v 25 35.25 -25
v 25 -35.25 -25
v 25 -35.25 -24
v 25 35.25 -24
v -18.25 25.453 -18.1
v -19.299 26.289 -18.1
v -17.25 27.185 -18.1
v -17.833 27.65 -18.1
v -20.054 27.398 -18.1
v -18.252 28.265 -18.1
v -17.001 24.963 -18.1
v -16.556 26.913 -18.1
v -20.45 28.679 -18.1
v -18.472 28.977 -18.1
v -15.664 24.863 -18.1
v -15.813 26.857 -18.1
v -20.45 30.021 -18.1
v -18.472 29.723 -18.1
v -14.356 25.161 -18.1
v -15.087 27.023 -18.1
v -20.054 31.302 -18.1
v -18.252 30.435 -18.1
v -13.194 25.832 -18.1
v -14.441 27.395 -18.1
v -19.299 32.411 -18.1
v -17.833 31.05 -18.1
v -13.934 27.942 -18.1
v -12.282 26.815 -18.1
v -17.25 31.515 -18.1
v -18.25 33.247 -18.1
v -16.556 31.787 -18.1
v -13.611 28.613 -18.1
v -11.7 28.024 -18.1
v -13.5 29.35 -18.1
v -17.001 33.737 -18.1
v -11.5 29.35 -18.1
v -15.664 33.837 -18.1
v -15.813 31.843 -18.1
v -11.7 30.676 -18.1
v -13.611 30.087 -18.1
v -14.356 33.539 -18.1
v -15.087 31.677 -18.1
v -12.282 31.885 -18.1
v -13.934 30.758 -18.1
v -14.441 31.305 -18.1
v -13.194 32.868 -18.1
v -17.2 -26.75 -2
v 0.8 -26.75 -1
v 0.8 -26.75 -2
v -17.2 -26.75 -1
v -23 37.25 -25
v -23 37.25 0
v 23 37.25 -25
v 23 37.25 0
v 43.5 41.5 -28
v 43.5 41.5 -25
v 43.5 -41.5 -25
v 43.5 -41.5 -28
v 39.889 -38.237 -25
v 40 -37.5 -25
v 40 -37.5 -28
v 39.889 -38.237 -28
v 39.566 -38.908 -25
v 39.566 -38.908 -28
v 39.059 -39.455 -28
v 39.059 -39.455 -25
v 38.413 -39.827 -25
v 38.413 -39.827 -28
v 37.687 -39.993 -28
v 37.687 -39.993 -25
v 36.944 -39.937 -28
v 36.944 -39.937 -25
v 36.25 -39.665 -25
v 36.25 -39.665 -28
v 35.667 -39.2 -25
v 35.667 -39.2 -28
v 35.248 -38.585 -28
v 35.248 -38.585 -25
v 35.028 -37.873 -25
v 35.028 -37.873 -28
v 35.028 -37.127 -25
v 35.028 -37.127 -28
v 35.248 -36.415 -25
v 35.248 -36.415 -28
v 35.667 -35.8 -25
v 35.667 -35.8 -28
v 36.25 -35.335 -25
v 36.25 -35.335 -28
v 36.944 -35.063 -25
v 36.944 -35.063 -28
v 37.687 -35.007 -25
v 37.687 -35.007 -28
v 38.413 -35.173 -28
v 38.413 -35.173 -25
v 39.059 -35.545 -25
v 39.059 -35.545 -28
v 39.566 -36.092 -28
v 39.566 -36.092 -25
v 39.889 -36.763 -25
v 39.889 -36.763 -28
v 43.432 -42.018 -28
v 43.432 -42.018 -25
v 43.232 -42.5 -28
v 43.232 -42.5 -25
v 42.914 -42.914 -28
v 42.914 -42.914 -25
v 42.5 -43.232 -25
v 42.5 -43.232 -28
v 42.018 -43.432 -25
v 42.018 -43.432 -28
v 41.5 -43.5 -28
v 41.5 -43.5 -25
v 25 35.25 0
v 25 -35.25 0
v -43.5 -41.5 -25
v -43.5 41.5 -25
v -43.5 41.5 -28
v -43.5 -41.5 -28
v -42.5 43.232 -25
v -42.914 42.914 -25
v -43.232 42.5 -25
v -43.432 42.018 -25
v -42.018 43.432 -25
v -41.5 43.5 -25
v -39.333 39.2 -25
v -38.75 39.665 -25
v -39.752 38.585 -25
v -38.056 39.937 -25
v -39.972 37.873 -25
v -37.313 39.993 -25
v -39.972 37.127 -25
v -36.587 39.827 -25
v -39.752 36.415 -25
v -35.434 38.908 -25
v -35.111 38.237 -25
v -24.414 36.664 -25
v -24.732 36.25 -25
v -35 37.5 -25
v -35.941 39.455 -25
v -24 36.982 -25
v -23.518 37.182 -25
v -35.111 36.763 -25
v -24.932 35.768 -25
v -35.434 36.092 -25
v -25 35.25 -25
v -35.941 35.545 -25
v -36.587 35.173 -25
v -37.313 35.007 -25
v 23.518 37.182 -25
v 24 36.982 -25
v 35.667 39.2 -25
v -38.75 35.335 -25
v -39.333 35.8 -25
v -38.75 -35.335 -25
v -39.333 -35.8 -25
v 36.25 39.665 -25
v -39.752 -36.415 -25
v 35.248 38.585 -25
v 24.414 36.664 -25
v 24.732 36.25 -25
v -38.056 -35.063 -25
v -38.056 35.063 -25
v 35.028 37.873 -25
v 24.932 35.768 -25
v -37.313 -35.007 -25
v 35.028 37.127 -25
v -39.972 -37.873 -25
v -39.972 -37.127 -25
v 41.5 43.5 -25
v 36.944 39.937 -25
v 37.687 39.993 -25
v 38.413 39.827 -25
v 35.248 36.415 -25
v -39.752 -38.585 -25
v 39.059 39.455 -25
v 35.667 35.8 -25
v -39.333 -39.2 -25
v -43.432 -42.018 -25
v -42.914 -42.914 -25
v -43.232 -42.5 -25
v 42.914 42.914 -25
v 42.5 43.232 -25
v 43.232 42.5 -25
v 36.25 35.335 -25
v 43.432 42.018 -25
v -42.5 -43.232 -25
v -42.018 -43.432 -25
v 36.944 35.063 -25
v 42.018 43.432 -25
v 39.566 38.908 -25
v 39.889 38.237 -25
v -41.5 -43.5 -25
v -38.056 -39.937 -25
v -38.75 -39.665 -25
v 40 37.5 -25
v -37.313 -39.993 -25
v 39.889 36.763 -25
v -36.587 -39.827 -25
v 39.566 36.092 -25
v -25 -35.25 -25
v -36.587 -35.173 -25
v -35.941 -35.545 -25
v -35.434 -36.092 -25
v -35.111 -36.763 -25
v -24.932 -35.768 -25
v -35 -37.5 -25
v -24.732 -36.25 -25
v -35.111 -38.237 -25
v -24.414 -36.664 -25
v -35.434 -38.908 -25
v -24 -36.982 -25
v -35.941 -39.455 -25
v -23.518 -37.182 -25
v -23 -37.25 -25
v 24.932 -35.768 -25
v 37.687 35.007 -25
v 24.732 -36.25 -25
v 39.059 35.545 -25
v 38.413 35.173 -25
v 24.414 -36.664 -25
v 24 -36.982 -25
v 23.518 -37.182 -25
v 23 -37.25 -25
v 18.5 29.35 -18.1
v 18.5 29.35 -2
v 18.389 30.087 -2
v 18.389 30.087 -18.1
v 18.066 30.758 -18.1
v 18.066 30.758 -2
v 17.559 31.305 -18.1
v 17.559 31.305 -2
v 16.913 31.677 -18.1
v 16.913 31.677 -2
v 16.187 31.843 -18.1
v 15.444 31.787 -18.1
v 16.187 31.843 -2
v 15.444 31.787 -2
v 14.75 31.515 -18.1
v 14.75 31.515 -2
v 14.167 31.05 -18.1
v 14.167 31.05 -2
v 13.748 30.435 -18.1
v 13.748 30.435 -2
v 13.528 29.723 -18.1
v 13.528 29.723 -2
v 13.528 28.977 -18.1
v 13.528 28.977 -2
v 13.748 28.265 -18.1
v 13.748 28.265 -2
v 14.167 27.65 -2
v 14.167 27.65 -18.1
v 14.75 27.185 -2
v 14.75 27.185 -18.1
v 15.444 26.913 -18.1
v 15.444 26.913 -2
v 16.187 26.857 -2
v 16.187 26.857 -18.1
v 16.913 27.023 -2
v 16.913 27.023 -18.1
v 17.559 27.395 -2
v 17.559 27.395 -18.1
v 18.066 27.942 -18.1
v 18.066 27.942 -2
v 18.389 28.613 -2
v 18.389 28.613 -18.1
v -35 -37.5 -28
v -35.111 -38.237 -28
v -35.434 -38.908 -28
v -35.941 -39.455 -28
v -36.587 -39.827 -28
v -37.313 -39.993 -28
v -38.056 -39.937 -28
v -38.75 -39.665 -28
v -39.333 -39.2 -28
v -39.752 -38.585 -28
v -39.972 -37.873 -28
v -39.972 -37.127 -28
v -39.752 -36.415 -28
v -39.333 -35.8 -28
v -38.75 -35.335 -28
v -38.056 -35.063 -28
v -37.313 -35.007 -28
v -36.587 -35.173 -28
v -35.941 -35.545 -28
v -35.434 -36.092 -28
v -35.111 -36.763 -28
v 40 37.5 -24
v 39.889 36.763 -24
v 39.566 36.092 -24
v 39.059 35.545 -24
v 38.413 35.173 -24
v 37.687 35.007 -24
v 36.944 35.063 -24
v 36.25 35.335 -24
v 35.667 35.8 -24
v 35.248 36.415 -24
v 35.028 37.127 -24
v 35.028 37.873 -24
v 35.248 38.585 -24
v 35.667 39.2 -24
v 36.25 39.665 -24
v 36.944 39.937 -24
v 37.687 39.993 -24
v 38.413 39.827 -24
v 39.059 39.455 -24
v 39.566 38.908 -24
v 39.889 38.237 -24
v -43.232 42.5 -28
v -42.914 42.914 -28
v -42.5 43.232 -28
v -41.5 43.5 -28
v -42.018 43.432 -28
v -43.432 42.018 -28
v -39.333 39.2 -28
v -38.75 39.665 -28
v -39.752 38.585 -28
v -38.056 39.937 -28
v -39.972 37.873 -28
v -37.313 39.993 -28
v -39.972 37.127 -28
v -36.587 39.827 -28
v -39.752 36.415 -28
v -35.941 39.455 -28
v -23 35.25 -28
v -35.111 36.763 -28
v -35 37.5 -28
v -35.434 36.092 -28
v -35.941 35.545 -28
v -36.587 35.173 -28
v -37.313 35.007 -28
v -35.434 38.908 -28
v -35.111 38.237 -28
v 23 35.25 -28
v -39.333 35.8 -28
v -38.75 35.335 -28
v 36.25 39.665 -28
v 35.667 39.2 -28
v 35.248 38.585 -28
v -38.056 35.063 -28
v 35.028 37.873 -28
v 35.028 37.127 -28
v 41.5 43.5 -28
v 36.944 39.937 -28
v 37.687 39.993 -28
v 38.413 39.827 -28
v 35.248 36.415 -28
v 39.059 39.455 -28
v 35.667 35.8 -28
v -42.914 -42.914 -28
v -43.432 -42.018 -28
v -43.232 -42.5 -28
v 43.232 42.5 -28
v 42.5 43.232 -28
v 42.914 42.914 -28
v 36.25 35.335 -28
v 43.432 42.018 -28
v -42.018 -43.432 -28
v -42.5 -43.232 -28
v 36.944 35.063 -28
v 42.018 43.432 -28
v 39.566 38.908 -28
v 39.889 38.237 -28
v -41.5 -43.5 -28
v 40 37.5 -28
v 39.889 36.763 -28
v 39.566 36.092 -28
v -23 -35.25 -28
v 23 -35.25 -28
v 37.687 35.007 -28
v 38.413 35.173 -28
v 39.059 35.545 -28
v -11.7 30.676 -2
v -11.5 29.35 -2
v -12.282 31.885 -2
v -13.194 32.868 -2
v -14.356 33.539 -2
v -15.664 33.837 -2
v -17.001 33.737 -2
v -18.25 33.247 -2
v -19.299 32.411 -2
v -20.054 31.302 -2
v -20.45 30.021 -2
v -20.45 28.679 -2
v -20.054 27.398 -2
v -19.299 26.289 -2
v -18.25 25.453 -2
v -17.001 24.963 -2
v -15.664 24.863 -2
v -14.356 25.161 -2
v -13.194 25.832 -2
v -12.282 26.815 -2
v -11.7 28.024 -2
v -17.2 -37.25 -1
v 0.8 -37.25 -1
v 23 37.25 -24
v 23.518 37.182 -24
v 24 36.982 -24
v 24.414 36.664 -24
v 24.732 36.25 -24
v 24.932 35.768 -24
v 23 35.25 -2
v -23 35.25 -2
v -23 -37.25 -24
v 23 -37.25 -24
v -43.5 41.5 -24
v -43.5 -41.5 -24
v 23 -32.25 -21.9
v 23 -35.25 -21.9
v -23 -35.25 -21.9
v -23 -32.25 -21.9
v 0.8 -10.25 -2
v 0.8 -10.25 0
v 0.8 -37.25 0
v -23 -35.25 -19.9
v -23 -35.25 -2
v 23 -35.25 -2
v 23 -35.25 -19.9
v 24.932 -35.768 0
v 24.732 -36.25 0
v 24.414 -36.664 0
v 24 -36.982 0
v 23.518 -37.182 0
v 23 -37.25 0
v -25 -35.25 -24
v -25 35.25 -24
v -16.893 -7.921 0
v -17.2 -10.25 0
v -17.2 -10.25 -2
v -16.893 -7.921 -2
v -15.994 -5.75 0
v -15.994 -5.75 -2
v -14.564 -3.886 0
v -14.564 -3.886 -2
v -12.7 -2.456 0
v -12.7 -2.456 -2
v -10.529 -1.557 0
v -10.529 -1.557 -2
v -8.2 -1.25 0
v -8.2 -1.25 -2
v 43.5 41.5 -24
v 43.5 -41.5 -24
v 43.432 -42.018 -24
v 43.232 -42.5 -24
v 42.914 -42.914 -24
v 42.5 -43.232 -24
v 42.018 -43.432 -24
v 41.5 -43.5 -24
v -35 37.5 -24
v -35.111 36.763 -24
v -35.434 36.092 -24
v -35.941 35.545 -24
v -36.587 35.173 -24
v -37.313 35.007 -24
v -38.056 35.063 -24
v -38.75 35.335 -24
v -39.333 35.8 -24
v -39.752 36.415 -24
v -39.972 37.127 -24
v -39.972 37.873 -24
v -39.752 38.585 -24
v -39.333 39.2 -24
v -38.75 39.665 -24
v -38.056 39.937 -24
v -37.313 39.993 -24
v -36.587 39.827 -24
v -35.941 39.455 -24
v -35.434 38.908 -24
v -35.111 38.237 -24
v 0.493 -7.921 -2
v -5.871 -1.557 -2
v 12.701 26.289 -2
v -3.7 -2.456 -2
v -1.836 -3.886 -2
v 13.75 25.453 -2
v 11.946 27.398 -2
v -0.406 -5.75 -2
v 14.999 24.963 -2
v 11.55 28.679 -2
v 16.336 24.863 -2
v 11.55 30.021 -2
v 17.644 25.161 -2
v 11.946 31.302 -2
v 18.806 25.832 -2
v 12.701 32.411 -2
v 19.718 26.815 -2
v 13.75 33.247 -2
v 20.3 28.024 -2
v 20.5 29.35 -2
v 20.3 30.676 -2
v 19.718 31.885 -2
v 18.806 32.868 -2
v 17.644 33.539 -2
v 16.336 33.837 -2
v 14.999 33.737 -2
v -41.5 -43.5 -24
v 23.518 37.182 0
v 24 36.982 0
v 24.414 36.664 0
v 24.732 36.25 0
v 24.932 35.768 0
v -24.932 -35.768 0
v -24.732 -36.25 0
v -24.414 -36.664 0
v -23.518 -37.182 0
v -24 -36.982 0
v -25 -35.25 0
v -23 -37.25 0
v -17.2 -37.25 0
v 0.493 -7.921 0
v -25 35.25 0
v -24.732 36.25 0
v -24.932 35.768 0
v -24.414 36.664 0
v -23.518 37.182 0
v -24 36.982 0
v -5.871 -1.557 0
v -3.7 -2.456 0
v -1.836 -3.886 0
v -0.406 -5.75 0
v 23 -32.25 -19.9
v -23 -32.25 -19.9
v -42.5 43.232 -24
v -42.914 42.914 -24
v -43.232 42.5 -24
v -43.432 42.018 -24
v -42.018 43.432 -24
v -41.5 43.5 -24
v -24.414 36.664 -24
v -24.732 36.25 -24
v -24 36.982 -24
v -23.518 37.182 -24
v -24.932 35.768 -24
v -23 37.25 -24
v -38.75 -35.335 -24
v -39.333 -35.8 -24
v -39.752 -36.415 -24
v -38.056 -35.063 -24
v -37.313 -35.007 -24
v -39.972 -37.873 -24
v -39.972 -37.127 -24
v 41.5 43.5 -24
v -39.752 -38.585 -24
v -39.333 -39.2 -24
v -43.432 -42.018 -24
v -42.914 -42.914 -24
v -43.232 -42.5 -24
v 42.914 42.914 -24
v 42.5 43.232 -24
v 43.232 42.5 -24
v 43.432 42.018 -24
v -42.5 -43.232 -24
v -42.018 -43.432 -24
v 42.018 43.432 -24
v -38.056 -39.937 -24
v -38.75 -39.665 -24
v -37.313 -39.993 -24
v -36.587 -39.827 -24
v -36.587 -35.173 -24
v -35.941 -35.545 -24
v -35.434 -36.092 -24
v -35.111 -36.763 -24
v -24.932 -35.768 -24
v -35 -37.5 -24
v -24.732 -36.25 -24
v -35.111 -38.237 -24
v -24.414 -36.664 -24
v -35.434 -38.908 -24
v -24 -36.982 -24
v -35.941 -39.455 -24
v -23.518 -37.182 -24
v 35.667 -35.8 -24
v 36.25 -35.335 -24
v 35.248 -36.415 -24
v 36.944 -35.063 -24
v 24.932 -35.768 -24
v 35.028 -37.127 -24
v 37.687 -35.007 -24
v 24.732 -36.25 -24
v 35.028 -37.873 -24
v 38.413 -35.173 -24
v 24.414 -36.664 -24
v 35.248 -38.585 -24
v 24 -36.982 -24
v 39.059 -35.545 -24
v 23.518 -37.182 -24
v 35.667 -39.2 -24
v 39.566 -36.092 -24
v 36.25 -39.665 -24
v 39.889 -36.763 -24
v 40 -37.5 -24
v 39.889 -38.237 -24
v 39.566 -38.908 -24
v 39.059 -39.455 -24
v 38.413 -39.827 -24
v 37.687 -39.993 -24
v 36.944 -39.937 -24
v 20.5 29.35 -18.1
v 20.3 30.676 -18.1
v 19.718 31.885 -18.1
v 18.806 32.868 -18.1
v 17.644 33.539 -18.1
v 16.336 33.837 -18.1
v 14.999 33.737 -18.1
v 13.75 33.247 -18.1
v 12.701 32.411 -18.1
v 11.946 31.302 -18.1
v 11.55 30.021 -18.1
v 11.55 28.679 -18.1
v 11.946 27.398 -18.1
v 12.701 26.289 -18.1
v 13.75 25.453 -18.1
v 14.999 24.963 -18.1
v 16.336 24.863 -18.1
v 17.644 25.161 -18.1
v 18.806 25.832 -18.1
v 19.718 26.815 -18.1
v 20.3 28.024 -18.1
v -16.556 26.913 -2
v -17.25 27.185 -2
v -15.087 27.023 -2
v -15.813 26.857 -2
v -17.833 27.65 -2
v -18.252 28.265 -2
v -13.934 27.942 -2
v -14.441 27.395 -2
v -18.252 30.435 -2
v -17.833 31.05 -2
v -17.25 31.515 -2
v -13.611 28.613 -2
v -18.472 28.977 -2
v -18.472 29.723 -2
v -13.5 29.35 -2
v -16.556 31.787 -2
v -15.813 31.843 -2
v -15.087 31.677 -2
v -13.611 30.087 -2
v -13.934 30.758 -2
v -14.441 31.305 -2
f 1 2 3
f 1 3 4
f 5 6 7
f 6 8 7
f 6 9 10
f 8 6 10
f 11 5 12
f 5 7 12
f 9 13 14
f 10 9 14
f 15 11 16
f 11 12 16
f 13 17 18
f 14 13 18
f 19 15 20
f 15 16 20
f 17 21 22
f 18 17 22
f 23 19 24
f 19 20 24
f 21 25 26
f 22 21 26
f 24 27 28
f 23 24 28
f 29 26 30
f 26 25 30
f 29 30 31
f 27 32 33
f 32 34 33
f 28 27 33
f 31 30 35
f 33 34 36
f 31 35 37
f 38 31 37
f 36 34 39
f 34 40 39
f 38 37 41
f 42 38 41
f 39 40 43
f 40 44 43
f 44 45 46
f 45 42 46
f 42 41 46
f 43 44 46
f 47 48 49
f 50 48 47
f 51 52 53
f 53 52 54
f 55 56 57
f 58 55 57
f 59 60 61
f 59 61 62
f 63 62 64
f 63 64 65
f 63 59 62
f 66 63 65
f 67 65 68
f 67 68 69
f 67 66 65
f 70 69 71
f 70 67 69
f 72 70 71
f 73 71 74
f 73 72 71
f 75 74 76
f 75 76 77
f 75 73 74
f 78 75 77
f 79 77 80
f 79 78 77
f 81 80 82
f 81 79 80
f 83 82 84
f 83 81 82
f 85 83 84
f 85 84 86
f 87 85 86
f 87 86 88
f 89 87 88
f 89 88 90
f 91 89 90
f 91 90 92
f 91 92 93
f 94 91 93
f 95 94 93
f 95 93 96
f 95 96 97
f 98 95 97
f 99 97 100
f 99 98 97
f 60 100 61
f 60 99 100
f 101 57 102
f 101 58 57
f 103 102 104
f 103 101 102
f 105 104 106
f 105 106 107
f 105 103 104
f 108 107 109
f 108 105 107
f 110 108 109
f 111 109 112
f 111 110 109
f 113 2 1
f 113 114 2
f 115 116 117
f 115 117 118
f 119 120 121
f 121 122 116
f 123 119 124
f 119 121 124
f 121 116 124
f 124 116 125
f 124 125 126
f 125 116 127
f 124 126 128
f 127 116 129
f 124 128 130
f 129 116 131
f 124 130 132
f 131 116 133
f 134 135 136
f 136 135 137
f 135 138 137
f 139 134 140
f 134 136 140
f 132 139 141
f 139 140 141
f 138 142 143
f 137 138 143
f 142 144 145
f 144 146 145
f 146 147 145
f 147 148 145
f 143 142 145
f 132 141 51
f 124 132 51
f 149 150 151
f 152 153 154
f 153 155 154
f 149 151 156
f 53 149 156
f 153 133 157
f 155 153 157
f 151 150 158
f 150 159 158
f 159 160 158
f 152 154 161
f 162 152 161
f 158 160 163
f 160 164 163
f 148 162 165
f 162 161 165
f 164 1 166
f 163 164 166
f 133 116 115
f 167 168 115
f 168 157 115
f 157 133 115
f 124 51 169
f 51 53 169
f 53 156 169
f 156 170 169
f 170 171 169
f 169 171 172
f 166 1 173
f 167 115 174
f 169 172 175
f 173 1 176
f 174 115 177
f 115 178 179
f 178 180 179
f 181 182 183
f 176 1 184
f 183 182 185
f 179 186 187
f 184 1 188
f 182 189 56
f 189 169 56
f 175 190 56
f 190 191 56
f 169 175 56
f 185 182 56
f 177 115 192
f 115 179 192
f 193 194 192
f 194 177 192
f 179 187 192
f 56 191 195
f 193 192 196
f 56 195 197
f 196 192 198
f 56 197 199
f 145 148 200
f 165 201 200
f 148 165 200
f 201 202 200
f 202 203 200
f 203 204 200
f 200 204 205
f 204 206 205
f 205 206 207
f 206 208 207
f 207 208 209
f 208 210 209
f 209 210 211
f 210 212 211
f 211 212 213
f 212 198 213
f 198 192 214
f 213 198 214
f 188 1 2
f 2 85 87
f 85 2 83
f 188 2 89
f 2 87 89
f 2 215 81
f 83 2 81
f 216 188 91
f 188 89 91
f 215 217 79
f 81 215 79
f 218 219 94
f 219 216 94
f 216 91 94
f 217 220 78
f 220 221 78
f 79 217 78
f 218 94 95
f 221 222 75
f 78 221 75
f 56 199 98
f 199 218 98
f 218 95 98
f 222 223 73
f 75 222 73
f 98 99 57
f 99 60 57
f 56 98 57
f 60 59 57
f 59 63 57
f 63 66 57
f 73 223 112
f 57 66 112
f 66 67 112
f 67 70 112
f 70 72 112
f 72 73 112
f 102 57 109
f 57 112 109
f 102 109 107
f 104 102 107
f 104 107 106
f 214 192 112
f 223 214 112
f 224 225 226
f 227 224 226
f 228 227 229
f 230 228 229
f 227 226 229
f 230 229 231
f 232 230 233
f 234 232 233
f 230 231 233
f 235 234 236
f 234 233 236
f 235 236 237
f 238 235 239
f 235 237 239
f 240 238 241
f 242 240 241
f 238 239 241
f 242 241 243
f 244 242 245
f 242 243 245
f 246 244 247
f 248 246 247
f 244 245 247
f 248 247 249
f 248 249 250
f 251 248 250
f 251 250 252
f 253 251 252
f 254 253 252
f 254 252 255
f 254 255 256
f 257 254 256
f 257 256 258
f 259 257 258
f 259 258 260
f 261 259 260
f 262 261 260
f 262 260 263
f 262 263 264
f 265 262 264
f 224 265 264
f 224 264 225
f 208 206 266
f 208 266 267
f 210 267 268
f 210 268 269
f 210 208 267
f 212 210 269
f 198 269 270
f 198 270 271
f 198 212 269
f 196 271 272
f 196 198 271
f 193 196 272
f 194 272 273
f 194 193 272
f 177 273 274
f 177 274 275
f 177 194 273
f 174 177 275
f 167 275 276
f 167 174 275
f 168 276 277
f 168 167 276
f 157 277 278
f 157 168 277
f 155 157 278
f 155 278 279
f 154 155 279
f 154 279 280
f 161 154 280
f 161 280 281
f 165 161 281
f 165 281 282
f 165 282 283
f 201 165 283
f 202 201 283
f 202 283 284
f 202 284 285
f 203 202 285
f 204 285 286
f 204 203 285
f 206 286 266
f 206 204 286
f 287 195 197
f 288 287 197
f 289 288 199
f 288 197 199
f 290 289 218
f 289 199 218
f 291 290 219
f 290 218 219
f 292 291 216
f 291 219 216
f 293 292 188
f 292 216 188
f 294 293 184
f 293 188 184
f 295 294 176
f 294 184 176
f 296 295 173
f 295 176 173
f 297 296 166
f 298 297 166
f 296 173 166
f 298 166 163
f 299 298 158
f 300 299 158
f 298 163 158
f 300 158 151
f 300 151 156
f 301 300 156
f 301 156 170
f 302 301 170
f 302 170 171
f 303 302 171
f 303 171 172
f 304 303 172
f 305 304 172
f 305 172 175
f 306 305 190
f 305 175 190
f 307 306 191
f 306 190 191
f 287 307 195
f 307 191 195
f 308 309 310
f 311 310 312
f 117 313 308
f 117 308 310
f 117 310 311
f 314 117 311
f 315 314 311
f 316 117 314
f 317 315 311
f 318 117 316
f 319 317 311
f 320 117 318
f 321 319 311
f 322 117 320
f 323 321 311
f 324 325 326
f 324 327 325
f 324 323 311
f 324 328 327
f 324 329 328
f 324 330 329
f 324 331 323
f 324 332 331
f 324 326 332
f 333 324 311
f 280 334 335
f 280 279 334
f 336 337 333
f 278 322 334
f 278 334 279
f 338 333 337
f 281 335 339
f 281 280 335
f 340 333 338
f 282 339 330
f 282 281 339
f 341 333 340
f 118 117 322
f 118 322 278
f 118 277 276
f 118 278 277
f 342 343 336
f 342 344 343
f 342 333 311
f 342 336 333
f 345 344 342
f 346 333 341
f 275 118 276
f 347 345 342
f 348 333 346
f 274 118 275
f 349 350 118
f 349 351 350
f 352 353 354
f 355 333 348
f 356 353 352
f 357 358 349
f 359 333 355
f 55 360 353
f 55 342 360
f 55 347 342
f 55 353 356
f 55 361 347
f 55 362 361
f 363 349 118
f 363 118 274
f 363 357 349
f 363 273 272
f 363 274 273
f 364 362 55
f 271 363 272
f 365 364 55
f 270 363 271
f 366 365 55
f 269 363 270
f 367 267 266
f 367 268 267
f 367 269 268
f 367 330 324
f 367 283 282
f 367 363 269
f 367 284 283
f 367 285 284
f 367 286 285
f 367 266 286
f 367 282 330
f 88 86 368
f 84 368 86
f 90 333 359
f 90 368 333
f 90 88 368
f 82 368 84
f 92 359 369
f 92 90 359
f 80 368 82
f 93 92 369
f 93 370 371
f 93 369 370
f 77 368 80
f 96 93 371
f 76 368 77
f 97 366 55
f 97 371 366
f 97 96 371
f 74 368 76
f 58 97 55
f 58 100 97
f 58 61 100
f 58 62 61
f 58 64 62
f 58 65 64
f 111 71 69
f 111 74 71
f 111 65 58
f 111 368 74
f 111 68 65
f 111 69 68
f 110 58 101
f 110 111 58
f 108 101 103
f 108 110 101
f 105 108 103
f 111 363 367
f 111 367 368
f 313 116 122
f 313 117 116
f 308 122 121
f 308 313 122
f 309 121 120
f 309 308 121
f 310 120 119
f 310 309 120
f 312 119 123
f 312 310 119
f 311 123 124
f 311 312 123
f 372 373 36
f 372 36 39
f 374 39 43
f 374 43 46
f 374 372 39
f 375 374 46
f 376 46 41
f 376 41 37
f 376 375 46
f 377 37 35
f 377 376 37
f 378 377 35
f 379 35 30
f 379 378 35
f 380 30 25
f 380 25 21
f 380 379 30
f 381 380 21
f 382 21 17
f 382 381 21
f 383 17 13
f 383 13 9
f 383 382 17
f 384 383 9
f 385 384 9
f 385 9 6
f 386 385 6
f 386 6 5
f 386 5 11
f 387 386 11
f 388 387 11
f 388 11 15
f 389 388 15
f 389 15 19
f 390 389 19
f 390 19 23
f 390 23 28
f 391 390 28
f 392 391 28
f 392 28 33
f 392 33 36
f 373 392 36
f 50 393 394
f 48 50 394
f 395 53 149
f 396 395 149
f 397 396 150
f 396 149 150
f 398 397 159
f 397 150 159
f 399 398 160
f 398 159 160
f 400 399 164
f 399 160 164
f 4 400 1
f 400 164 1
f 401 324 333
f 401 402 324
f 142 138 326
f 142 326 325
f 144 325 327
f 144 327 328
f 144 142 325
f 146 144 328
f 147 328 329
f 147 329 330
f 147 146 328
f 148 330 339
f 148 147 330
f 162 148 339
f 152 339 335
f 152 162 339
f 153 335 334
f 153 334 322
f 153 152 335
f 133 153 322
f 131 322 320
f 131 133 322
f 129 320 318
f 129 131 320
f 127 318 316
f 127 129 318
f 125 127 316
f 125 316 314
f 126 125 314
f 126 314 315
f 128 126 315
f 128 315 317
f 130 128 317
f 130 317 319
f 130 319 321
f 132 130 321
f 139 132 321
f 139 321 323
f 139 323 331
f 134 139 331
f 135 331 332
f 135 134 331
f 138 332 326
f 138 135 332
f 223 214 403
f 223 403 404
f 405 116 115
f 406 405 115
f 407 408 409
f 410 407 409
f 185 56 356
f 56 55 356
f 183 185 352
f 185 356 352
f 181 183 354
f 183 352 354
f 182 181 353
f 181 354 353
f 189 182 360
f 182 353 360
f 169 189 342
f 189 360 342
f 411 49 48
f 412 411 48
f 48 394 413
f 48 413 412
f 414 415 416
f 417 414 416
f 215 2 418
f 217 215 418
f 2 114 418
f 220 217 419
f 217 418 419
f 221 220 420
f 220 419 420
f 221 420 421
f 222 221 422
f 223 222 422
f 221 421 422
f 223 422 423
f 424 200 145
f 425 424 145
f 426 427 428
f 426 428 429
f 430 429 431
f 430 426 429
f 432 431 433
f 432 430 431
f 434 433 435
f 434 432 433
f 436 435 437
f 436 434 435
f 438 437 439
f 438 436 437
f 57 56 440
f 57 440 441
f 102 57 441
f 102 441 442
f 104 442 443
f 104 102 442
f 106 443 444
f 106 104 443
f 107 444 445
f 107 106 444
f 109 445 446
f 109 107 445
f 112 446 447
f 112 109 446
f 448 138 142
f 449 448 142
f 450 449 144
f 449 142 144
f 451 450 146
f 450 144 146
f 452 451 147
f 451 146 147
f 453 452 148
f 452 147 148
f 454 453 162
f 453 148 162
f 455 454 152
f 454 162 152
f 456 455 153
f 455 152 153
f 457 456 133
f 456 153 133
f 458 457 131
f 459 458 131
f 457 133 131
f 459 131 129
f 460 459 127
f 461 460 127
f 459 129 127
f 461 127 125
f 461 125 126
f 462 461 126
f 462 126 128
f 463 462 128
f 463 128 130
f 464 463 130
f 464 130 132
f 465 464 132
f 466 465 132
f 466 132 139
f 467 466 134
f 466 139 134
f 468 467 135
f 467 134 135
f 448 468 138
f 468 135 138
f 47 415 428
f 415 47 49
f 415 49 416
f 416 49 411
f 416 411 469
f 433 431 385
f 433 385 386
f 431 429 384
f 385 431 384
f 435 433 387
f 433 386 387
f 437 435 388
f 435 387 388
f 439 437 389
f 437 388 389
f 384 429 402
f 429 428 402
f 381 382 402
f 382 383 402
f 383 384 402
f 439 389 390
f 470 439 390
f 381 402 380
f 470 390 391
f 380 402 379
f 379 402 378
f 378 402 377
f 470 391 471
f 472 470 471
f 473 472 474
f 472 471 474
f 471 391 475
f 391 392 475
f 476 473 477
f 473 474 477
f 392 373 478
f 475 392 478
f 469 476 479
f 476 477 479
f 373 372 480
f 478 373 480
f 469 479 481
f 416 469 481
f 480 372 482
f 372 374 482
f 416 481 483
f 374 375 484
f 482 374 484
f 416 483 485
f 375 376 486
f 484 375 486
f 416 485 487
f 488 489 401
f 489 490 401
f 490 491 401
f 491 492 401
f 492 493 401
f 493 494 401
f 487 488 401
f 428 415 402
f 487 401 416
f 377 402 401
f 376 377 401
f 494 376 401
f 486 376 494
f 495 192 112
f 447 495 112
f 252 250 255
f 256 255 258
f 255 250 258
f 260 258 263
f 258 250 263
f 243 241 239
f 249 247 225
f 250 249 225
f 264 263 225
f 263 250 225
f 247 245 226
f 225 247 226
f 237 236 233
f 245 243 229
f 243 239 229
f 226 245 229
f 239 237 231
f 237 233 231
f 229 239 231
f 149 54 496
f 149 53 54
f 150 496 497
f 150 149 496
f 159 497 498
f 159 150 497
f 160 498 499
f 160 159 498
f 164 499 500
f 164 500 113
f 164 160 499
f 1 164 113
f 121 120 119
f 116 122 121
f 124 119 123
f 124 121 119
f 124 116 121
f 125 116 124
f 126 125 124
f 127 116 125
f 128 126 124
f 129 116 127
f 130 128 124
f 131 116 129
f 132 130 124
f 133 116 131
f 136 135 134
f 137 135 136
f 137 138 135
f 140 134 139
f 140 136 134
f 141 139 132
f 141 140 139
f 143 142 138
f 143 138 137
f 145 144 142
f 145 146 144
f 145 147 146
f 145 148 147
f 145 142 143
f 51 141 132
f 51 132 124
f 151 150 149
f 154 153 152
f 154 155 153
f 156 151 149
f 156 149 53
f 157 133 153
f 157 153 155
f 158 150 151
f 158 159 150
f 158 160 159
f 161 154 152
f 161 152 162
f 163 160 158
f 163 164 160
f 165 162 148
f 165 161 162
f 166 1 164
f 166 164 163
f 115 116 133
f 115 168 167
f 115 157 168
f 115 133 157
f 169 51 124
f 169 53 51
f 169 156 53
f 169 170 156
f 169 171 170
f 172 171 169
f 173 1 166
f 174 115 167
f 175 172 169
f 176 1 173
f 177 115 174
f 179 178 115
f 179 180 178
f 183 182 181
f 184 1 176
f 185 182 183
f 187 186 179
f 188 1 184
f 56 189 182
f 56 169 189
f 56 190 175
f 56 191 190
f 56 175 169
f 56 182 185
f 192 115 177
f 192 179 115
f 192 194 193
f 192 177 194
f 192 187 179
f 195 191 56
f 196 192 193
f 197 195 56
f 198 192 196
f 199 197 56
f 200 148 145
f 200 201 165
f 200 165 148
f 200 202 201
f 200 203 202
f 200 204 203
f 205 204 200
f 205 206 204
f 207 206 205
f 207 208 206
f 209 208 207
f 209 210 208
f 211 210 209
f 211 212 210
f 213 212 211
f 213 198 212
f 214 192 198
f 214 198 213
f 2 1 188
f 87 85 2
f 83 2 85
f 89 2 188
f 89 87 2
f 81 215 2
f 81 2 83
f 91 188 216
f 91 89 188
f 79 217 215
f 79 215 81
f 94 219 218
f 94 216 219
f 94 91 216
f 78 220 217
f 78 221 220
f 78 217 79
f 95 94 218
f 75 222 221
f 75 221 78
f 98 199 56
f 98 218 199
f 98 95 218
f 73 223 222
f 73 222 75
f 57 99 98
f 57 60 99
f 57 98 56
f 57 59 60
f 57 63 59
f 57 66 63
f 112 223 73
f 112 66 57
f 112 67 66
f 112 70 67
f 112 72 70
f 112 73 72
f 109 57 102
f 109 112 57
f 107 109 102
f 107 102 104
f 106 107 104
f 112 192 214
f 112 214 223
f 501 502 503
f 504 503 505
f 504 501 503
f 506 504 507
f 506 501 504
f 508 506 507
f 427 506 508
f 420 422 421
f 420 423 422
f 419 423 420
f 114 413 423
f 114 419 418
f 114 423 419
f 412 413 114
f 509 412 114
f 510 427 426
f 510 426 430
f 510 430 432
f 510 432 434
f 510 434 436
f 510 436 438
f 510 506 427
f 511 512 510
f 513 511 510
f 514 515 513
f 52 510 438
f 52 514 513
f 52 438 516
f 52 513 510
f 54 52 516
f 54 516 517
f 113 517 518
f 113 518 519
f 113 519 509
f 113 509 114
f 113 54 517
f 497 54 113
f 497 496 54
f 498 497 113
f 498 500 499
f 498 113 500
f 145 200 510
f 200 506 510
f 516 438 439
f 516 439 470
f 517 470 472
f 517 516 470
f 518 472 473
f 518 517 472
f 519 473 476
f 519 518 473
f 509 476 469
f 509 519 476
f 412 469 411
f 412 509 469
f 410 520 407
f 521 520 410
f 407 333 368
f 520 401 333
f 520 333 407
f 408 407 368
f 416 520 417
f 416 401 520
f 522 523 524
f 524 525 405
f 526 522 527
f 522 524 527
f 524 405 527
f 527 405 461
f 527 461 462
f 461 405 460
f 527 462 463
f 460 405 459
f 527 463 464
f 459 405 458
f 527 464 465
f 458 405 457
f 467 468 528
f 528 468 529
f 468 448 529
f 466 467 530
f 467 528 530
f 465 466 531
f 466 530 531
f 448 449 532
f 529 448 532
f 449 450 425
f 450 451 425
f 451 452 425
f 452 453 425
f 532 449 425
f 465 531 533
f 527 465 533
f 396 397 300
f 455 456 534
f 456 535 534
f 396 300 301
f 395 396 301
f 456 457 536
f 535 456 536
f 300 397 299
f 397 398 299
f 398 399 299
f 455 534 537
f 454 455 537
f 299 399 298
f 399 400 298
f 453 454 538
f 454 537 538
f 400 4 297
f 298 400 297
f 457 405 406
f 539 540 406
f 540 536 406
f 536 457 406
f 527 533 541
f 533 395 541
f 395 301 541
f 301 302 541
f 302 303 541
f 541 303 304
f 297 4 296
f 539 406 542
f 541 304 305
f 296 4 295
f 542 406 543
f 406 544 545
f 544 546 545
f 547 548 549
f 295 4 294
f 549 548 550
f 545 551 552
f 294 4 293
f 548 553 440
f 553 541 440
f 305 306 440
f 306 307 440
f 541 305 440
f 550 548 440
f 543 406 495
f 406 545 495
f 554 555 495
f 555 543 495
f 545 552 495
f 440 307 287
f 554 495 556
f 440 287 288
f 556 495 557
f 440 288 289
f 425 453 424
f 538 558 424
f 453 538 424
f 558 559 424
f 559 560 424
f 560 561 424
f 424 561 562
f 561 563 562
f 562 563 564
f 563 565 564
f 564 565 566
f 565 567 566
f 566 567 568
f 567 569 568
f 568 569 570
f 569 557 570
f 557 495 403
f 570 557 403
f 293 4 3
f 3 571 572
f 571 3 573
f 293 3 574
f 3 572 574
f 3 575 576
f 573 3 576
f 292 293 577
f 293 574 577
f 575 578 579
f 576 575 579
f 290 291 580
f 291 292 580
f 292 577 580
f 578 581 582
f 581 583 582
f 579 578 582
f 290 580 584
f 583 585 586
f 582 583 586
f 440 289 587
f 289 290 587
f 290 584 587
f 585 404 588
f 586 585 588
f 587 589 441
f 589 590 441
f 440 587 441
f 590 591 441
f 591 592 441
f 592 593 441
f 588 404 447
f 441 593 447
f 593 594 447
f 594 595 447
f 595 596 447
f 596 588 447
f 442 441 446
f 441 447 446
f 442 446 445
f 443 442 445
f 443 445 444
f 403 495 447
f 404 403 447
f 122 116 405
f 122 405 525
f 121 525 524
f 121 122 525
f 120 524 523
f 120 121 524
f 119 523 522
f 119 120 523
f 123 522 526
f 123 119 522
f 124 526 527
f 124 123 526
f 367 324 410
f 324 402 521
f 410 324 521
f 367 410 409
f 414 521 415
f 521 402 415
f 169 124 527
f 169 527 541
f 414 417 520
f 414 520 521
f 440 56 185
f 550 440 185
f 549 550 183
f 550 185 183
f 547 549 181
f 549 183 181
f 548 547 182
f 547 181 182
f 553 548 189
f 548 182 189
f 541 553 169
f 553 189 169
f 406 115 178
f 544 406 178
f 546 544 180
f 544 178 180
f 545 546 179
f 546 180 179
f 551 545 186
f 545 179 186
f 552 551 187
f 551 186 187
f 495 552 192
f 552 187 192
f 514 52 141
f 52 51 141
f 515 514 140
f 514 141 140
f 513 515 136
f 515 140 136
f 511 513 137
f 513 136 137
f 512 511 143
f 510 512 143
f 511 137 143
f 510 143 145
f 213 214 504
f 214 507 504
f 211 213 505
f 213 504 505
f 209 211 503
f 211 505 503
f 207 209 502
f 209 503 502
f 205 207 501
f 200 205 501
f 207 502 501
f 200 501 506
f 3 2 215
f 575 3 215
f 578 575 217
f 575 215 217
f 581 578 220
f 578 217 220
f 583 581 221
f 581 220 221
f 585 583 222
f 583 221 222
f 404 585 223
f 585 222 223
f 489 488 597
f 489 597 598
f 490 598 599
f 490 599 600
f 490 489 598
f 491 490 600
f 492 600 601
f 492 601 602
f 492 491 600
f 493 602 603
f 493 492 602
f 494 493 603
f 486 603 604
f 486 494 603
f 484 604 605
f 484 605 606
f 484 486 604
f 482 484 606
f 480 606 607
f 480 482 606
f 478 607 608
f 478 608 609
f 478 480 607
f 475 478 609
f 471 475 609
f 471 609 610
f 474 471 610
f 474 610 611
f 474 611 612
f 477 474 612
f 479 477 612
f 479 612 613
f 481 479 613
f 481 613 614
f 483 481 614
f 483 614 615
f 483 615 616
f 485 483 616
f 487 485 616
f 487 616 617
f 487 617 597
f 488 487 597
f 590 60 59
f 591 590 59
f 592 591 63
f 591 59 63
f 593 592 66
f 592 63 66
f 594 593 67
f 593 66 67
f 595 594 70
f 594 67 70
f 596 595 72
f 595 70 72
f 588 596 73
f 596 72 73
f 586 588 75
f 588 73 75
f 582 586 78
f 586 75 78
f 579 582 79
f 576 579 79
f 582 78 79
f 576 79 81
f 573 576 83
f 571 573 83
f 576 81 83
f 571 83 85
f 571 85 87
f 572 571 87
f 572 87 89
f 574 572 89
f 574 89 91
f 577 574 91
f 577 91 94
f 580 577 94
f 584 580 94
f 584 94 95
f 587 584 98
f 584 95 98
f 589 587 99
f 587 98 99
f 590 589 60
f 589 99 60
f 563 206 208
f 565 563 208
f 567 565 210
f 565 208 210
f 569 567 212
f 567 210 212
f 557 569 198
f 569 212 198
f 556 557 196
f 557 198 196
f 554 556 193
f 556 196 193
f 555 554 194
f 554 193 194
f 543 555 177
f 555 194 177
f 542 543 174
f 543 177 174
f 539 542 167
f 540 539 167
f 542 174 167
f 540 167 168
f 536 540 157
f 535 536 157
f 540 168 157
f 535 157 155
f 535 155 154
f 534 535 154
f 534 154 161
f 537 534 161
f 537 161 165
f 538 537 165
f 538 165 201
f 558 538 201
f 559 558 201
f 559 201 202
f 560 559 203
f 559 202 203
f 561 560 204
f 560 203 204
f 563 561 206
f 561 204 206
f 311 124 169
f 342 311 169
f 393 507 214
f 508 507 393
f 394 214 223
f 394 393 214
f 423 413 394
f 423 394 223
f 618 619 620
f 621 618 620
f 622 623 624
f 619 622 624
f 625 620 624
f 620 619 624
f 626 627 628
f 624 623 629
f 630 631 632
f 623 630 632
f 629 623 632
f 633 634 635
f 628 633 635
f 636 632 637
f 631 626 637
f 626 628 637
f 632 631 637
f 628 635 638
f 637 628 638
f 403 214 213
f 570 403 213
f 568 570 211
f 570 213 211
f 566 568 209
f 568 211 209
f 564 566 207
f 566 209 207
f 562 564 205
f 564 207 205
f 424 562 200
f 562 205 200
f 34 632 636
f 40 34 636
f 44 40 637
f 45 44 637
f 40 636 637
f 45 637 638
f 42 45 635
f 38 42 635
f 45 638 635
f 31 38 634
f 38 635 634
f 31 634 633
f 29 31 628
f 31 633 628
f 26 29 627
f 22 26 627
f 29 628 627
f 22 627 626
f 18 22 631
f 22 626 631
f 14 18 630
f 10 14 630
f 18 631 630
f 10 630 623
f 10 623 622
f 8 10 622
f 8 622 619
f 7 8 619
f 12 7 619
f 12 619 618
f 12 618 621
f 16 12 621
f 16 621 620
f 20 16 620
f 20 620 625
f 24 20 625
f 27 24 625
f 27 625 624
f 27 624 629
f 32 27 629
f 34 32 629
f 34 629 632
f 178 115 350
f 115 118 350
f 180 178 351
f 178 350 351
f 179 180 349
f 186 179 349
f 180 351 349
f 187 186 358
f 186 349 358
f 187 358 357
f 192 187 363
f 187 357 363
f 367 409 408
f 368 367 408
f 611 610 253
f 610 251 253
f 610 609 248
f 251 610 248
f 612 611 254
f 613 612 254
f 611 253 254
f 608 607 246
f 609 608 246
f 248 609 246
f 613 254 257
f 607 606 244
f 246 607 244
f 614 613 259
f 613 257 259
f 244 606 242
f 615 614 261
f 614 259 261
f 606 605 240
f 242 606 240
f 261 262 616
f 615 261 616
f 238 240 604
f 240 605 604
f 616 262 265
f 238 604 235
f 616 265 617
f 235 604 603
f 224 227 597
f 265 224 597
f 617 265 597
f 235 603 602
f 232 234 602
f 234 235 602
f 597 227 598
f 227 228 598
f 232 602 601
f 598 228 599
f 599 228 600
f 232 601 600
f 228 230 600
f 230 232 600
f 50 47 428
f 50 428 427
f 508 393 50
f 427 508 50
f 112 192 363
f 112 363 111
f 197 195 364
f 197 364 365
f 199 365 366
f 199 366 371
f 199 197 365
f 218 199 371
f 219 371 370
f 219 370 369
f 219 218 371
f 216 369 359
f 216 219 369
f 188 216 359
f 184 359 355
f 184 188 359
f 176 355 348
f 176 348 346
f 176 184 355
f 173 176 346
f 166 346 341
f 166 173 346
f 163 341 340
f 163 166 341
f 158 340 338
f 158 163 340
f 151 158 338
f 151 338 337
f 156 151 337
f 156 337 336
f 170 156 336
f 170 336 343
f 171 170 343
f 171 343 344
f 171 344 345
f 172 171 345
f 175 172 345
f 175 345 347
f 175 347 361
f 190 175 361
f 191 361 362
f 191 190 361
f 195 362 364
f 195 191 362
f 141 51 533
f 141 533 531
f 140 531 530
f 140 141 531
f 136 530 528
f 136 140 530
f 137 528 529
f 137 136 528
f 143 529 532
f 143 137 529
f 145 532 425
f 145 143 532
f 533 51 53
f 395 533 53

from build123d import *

# Parameters (mm, degrees)
F0_W      = 50
F0_H      = 74.5
F0_W_2    = 46
F0_H_2    = 70.5
F0_R      = 4.5
F0_R_2    = 2.5
F1_DEPTH  = 2
F2_DEPTH  = 25
F3_DEPTH  = 18.1
F4_W      = 46
F4_H      = 2
F5_DEPTH  = 3
F6_W      = 87
F6_H      = 87
F6_R      = 2.5
F6_W_2    = 50
F6_H_2    = 74.5
F6_W_3    = 46
F6_H_3    = 70.5
F7_DEPTH  = 3
F8_R      = 2
F9_DEPTH  = 1
F10_W     = 18
F10_H     = 1
F11_DEPTH = 25


with BuildPart() as f1:
    # F0 (on Top) → F1 (new body)
    with BuildSketch(Plane.XY):
        Rectangle(F0_W, F0_H)
        Rectangle(F0_W_2, F0_H_2, mode=Mode.SUBTRACT)
        Rectangle(F0_W_2, F0_H_2)
        Polygon((0.8, -26.75), (-17.2, -26.75), (-17.2, -10.25), (-17.2, -1.25), (-8.2, -1.25), (0.8, -1.25), (0.8, -10.25), align=None, mode=Mode.SUBTRACT)
        with Locations((-16, 29.35)):
            Circle(F0_R, mode=Mode.SUBTRACT)
        with Locations((16, 29.35)):
            Circle(F0_R, mode=Mode.SUBTRACT)
        with Locations((-16, 29.35)):
            Circle(F0_R)
        with Locations((-16, 29.35)):
            Circle(F0_R_2, mode=Mode.SUBTRACT)
        with Locations((16, 29.35)):
            Circle(F0_R)
        with Locations((16, 29.35)):
            Circle(F0_R_2, mode=Mode.SUBTRACT)
        with Locations((-16, 29.35)):
            Circle(F0_R_2)
        with Locations((16, 29.35)):
            Circle(F0_R_2)
        with BuildLine():
            Line((-17.2, -1.25), (-17.2, -10.25))
            ThreePointArc((-17.2, -10.25), (-14.5639610307, -3.8860389693), (-8.2, -1.25))
            Line((-8.2, -1.25), (-17.2, -1.25))
        make_face()
        with BuildLine():
            ThreePointArc((-8.2, -1.25), (-1.8360389693, -3.8860389693), (0.8, -10.25))
            Line((0.8, -10.25), (0.8, -1.25))
            Line((0.8, -1.25), (-8.2, -1.25))
        make_face()
    extrude(amount=-F1_DEPTH)

    # F0 (on Top) → F2 (join)
    with BuildSketch(Plane.XY):
        Rectangle(F0_W, F0_H)
        Rectangle(F0_W_2, F0_H_2, mode=Mode.SUBTRACT)
    extrude(amount=-F2_DEPTH)

    # F0 (on Top) → F3 (join)
    with BuildSketch(Plane.XY):
        with Locations((-16, 29.35)):
            Circle(F0_R)
        with Locations((-16, 29.35)):
            Circle(F0_R_2, mode=Mode.SUBTRACT)
        with Locations((16, 29.35)):
            Circle(F0_R)
        with Locations((16, 29.35)):
            Circle(F0_R_2, mode=Mode.SUBTRACT)
    extrude(amount=-F3_DEPTH)

    # F4 (on face) → F5 (join)
    with BuildSketch(Plane(origin=(0, -35.25, 0), x_dir=(-1, 0, 0), z_dir=(0, 1, 0))):
        with Locations((0, -20.9)):
            Rectangle(F4_W, F4_H)
    extrude(amount=F5_DEPTH)

    # F6 (on face) → F7 (join)
    with BuildSketch(Plane(origin=(0, 0, -25), x_dir=(1, 0, 0), z_dir=(0, 0, -1))):
        Rectangle(F6_W, F6_H)
        with Locations((-37.5, -37.5)):
            Circle(F6_R, mode=Mode.SUBTRACT)
        with Locations((37.5, -37.5)):
            Circle(F6_R, mode=Mode.SUBTRACT)
        with Locations((-37.5, 37.5)):
            Circle(F6_R, mode=Mode.SUBTRACT)
        Rectangle(F6_W_2, F6_H_2, mode=Mode.SUBTRACT)
        with Locations((37.5, 37.5)):
            Circle(F6_R, mode=Mode.SUBTRACT)
        Rectangle(F6_W_2, F6_H_2)
        Rectangle(F6_W_3, F6_H_3, mode=Mode.SUBTRACT)
    extrude(amount=F7_DEPTH)

    # F8
    f8_edges = [f1.edges().sort_by_distance(p)[0] for p in [
        (25, -37.25, -12.5),
        (43.5, -43.5, -26.5),
        (-43.5, -43.5, -26.5),
        (43.5, 43.5, -26.5),
        (-43.5, 43.5, -26.5),
        (-25, 37.25, -12.5),
        (25, 37.25, -12.5),
        (-25, -37.25, -12.5),
    ]]
    fillet(f8_edges, radius=F8_R)


with BuildPart() as f9:
    # F9 (new): a face of the model
    f9_faces = [f1.part.faces().sort_by_distance(p)[0] for p in [
        (0, 42.2696342007, -25),
    ]]
    extrude(f9_faces, amount=F9_DEPTH)


with BuildPart() as f1_1:
    add(f1.part)

    # F10 (on face) → F11 (cut)
    with BuildSketch(Plane.XZ.offset(37.25)):
        with Locations((-8.2, -0.5)):
            Rectangle(F10_W, F10_H)
    extrude(amount=-F11_DEPTH, mode=Mode.SUBTRACT)


solid = Compound([f9.part, f1_1.part])
